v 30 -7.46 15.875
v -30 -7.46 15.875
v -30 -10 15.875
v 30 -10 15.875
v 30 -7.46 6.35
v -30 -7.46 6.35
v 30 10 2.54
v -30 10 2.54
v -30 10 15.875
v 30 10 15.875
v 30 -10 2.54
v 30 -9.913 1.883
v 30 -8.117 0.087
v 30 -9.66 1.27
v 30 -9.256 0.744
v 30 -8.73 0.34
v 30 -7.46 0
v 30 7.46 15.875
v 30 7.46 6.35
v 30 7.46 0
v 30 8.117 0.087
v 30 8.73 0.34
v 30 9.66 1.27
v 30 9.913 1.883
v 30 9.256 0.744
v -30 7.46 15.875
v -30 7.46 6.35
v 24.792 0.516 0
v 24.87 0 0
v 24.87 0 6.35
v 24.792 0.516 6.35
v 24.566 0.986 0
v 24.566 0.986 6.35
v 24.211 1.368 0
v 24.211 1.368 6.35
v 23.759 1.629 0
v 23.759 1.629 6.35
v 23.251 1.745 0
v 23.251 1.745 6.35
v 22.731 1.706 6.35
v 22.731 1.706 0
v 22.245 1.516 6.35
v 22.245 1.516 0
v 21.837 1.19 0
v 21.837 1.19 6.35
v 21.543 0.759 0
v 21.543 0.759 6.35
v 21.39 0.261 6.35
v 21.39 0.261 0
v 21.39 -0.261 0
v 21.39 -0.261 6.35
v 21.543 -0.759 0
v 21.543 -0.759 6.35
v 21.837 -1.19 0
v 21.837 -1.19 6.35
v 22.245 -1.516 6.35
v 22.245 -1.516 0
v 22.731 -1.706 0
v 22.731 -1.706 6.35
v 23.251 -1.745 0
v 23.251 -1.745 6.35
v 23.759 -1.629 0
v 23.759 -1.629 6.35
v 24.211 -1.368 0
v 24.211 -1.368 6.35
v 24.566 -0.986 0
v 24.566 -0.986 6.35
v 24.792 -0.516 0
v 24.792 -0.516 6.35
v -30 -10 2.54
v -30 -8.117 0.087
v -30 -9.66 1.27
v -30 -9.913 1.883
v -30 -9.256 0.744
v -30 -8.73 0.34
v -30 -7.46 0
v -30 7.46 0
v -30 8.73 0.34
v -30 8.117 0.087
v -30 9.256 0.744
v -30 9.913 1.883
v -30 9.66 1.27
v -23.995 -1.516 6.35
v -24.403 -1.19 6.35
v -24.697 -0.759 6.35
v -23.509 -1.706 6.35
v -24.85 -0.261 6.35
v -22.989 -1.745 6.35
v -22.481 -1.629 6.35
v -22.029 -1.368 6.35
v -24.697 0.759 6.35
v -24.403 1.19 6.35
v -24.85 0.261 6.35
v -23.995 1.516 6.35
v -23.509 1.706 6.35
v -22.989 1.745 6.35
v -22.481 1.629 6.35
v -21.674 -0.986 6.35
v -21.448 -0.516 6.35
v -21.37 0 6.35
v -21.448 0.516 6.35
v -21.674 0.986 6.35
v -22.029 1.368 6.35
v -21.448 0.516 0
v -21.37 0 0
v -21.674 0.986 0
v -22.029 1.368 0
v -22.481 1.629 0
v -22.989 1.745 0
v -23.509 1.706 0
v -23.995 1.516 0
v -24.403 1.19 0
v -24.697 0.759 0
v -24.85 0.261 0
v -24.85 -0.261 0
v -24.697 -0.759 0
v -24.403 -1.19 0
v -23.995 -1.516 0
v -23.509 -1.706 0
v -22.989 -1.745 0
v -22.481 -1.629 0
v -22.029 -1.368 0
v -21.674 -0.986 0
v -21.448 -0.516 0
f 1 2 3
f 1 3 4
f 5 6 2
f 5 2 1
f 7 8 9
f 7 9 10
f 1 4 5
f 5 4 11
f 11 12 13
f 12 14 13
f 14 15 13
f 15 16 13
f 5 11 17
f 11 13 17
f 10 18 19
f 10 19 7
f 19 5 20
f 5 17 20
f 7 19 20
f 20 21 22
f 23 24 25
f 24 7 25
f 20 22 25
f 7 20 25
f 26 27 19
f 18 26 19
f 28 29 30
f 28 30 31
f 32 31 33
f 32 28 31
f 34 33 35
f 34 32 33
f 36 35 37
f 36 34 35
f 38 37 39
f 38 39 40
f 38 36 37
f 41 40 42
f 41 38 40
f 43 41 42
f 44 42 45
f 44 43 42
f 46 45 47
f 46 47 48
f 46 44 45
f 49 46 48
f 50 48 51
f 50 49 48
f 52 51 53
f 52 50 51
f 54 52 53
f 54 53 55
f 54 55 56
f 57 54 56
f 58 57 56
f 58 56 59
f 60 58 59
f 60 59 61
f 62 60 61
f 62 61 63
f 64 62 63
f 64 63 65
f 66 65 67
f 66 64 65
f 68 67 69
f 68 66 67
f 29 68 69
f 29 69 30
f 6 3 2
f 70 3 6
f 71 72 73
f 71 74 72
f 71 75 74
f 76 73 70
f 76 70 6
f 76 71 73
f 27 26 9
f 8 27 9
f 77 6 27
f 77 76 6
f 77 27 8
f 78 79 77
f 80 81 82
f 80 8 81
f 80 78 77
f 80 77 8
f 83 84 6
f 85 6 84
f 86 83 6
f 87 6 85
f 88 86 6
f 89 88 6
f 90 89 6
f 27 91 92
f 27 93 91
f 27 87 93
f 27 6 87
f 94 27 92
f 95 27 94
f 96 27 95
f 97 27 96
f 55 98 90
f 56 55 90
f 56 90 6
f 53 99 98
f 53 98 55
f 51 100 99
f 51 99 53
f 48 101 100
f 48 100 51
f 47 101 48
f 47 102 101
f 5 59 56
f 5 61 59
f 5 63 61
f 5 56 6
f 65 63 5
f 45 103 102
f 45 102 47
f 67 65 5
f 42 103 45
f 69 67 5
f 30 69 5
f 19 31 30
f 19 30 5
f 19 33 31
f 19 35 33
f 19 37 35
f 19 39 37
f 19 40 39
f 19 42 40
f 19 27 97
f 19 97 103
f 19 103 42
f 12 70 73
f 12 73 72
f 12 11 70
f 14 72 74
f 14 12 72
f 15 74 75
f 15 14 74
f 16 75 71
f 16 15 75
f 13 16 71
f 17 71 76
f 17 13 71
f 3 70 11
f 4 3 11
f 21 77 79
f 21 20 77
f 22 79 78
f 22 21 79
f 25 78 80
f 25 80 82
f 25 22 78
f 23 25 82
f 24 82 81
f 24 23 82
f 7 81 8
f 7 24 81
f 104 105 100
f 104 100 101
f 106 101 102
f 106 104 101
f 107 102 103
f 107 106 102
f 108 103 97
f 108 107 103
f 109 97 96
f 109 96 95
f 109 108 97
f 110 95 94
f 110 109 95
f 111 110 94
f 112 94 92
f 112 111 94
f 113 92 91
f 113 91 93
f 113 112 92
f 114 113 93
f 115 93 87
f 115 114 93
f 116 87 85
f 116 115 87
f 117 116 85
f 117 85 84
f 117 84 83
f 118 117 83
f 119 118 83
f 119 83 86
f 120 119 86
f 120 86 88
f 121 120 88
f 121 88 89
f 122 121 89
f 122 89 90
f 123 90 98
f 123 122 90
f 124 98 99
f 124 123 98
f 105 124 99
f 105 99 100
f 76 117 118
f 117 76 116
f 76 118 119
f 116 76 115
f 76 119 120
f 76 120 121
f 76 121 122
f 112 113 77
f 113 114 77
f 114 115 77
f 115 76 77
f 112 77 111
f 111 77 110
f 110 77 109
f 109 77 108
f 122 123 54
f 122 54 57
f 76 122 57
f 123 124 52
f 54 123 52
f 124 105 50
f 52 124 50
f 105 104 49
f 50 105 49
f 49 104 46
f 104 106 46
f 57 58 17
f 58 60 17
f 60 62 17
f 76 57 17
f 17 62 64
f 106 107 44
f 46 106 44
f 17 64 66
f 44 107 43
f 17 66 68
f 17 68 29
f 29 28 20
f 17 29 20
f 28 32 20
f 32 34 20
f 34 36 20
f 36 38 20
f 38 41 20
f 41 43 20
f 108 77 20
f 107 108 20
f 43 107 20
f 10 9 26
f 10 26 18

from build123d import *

# Parameters (mm, degrees)
SKETCH1_W           = 60
SKETCH1_H           = 20
SKETCH1_R           = 1.75
BOSS_EXTRUDE1_DEPTH = 6.35
SKETCH2_W           = 60
SKETCH2_H           = 2.54
BOSS_EXTRUDE2_DEPTH = 9.525
FILLET1_R           = 2.54


with BuildPart() as part:
    # Sketch1 → Boss-Extrude1 (new body)
    with BuildSketch(Plane.XY):
        Rectangle(SKETCH1_W, SKETCH1_H)
        with Locations((-23.12, 0)):
            Circle(SKETCH1_R, mode=Mode.SUBTRACT)
        with Locations((23.12, 0)):
            Circle(SKETCH1_R, mode=Mode.SUBTRACT)
    extrude(amount=BOSS_EXTRUDE1_DEPTH)

    # Sketch2 → Boss-Extrude2 (add)
    with BuildSketch(Plane.XY.offset(6.35)):
        with Locations((0, 8.73)):
            Rectangle(SKETCH2_W, SKETCH2_H)
        with Locations((0, -8.73)):
            Rectangle(SKETCH2_W, SKETCH2_H)
    extrude(amount=BOSS_EXTRUDE2_DEPTH)

    # Fillet1
    fillet1_edges = [part.edges().sort_by_distance(p)[0] for p in [
        (0, 10, 0),
        (0, -10, 0),
    ]]
    fillet(fillet1_edges, radius=FILLET1_R)


solid = part.part
